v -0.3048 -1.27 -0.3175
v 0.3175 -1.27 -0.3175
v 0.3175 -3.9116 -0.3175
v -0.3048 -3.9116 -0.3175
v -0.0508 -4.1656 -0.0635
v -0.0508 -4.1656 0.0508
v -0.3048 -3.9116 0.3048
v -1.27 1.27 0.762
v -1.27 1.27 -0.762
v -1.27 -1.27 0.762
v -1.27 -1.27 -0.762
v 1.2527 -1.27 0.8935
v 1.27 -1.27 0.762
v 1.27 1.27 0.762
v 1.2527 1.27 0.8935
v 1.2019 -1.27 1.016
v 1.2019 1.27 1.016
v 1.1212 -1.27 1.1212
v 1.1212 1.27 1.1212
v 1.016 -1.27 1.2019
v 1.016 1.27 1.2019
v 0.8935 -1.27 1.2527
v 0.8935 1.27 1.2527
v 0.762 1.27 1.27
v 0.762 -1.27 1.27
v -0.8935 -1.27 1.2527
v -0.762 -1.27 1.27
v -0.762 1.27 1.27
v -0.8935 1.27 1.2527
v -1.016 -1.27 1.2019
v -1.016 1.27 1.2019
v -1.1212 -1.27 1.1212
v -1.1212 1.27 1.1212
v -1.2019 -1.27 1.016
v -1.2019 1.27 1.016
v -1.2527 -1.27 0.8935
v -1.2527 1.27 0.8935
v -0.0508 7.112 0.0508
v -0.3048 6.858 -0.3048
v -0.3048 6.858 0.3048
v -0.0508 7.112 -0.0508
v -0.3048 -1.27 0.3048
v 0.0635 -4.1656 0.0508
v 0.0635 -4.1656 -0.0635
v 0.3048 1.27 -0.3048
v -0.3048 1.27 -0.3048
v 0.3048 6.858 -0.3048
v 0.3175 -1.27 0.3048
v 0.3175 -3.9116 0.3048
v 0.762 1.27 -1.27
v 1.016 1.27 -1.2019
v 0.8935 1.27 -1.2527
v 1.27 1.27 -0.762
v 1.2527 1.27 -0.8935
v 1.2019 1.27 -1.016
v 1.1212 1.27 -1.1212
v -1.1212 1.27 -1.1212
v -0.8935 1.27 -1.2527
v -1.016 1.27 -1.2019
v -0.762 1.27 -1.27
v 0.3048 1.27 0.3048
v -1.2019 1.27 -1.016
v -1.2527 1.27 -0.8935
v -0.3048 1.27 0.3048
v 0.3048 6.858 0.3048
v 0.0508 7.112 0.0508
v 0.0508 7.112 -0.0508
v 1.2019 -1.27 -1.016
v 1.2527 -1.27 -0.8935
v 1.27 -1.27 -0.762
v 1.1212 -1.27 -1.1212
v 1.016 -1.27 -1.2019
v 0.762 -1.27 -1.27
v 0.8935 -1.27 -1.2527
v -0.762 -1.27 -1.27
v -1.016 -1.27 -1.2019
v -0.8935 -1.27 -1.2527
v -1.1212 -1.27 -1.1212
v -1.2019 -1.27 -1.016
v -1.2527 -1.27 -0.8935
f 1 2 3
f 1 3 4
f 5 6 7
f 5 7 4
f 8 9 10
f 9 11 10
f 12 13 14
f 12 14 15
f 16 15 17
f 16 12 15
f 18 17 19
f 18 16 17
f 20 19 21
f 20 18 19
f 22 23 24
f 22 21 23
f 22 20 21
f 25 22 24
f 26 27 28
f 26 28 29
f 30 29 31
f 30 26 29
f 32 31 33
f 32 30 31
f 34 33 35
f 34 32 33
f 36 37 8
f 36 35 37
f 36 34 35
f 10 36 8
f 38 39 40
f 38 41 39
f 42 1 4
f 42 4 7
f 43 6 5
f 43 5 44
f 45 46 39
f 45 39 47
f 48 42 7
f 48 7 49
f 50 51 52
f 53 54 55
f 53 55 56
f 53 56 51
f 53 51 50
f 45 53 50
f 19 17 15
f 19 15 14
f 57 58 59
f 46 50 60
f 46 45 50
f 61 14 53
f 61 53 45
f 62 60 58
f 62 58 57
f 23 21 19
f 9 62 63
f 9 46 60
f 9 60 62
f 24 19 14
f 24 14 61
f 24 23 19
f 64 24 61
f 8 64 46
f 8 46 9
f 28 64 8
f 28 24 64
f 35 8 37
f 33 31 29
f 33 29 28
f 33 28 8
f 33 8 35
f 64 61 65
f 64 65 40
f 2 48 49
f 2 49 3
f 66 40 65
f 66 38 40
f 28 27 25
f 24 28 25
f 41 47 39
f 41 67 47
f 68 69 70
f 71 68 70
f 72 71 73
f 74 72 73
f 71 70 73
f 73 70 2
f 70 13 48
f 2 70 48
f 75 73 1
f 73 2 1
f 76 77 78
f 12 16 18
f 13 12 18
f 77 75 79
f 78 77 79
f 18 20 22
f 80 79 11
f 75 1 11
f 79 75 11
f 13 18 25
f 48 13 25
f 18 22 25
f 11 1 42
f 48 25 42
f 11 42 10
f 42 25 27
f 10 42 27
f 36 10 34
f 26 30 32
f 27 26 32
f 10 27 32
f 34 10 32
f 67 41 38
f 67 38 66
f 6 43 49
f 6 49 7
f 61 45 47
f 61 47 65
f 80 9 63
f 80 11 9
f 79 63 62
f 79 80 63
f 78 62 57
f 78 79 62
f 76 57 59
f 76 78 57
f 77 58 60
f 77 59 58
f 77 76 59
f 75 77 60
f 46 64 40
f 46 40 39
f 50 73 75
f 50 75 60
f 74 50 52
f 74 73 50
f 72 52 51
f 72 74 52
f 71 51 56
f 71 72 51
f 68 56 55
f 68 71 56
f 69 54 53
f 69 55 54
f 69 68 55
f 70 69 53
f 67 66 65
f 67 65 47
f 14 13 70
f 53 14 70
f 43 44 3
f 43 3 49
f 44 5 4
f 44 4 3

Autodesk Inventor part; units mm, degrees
ref_plane "YZ Plane" through (0, 0, 0) normal (1, 0, 0) x (0, 1, 0)
ref_plane "XZ Plane" through (0, 0, 0) normal (0, 1, 0) x (-1, 0, 0)
ref_plane "XY Plane" through (0, 0, 0) normal (0, 0, 1) x (1, 0, 0)
sketch "Sketch1" plane through (0, 0, 0) normal (0, 1, 0) x (-1, 0, 0)
  line L0 (-0.762, -1.27) -> (0.762, -1.27)
  line L1 (1.27, -0.762) -> (1.27, 0.762)
  line L2 (0.762, 1.27) -> (-0.762, 1.27)
  line L3 (-1.27, 0.762) -> (-1.27, -0.762)
  line L4 (-1.27, -1.27) -> (1.27, 1.27) construction
  line L5 (1.27, -1.27) -> (-1.27, 1.27) construction
  arc A0 (1.27, 0.762) -> (0.762, 1.27) centre (0.762, 0.762) ccw
  arc A1 (0.762, -1.27) -> (1.27, -0.762) centre (0.762, -0.762) ccw
  arc A2 (-1.27, -0.762) -> (-0.762, -1.27) centre (-0.762, -0.762) ccw
  arc A3 (-0.762, 1.27) -> (-1.27, 0.762) centre (-0.762, 0.762) ccw
  line L6 (-0.762, -3.81) -> (0.762, -3.81)
  line L7 (1.27, -3.302) -> (1.27, -1.778)
  line L8 (0.762, -1.27) -> (-0.762, -1.27)
  line L9 (-1.27, -1.778) -> (-1.27, -3.302)
  line L10 (-1.27, -3.81) -> (1.27, -1.27) construction
  line L11 (1.27, -3.81) -> (-1.27, -1.27) construction
  arc A4 (1.27, -1.778) -> (0.762, -1.27) centre (0.762, -1.778) ccw
  arc A5 (0.762, -3.81) -> (1.27, -3.302) centre (0.762, -3.302) ccw
  arc A6 (-1.27, -3.302) -> (-0.762, -3.81) centre (-0.762, -3.302) ccw
  arc A7 (-0.762, -1.27) -> (-1.27, -1.778) centre (-0.762, -1.778) ccw
  line L12 (-0.762, -6.35) -> (0.762, -6.35)
  line L13 (1.27, -5.842) -> (1.27, -4.318)
  line L14 (0.762, -3.81) -> (-0.762, -3.81)
  line L15 (-1.27, -4.318) -> (-1.27, -5.842)
  line L16 (-1.27, -6.35) -> (1.27, -3.81) construction
  line L17 (1.27, -6.35) -> (-1.27, -3.81) construction
  arc A8 (1.27, -4.318) -> (0.762, -3.81) centre (0.762, -4.318) ccw
  arc A9 (0.762, -6.35) -> (1.27, -5.842) centre (0.762, -5.842) ccw
  arc A10 (-1.27, -5.842) -> (-0.762, -6.35) centre (-0.762, -5.842) ccw
  arc A11 (-0.762, -3.81) -> (-1.27, -4.318) centre (-0.762, -4.318) ccw
  line L18 (-0.762, -8.89) -> (0.762, -8.89)
  line L19 (1.27, -8.382) -> (1.27, -6.858)
  line L20 (0.762, -6.35) -> (-0.762, -6.35)
  line L21 (-1.27, -6.858) -> (-1.27, -8.382)
  line L22 (-1.27, -8.89) -> (1.27, -6.35) construction
  line L23 (1.27, -8.89) -> (-1.27, -6.35) construction
  arc A12 (1.27, -6.858) -> (0.762, -6.35) centre (0.762, -6.858) ccw
  arc A13 (0.762, -8.89) -> (1.27, -8.382) centre (0.762, -8.382) ccw
  arc A14 (-1.27, -8.382) -> (-0.762, -8.89) centre (-0.762, -8.382) ccw
  arc A15 (-0.762, -6.35) -> (-1.27, -6.858) centre (-0.762, -6.858) ccw
  line L24 (-0.762, -11.43) -> (0.762, -11.43)
  line L25 (1.27, -10.922) -> (1.27, -9.398)
  line L26 (0.762, -8.89) -> (-0.762, -8.89)
  line L27 (-1.27, -9.398) -> (-1.27, -10.922)
  line L28 (-1.27, -11.43) -> (1.27, -8.89) construction
  line L29 (1.27, -11.43) -> (-1.27, -8.89) construction
  arc A16 (1.27, -9.398) -> (0.762, -8.89) centre (0.762, -9.398) ccw
  arc A17 (0.762, -11.43) -> (1.27, -10.922) centre (0.762, -10.922) ccw
  arc A18 (-1.27, -10.922) -> (-0.762, -11.43) centre (-0.762, -10.922) ccw
  arc A19 (-0.762, -8.89) -> (-1.27, -9.398) centre (-0.762, -9.398) ccw
  line L30 (-0.762, -13.97) -> (0.762, -13.97)
  line L31 (1.27, -13.462) -> (1.27, -11.938)
  line L32 (0.762, -11.43) -> (-0.762, -11.43)
  line L33 (-1.27, -11.938) -> (-1.27, -13.462)
  line L34 (-1.27, -13.97) -> (1.27, -11.43) construction
  line L35 (1.27, -13.97) -> (-1.27, -11.43) construction
  arc A20 (1.27, -11.938) -> (0.762, -11.43) centre (0.762, -11.938) ccw
  arc A21 (0.762, -13.97) -> (1.27, -13.462) centre (0.762, -13.462) ccw
  arc A22 (-1.27, -13.462) -> (-0.762, -13.97) centre (-0.762, -13.462) ccw
  arc A23 (-0.762, -11.43) -> (-1.27, -11.938) centre (-0.762, -11.938) ccw
  line L36 (-0.762, -16.51) -> (0.762, -16.51)
  line L37 (1.27, -16.002) -> (1.27, -14.478)
  line L38 (0.762, -13.97) -> (-0.762, -13.97)
  line L39 (-1.27, -14.478) -> (-1.27, -16.002)
  line L40 (-1.27, -16.51) -> (1.27, -13.97) construction
  line L41 (1.27, -16.51) -> (-1.27, -13.97) construction
  arc A24 (1.27, -14.478) -> (0.762, -13.97) centre (0.762, -14.478) ccw
  arc A25 (0.762, -16.51) -> (1.27, -16.002) centre (0.762, -16.002) ccw
  arc A26 (-1.27, -16.002) -> (-0.762, -16.51) centre (-0.762, -16.002) ccw
  arc A27 (-0.762, -13.97) -> (-1.27, -14.478) centre (-0.762, -14.478) ccw
  line L42 (-0.762, -19.05) -> (0.762, -19.05)
  line L43 (1.27, -18.542) -> (1.27, -17.018)
  line L44 (0.762, -16.51) -> (-0.762, -16.51)
  line L45 (-1.27, -17.018) -> (-1.27, -18.542)
  line L46 (-1.27, -19.05) -> (1.27, -16.51) construction
  line L47 (1.27, -19.05) -> (-1.27, -16.51) construction
  arc A28 (1.27, -17.018) -> (0.762, -16.51) centre (0.762, -17.018) ccw
  arc A29 (0.762, -19.05) -> (1.27, -18.542) centre (0.762, -18.542) ccw
  arc A30 (-1.27, -18.542) -> (-0.762, -19.05) centre (-0.762, -18.542) ccw
  arc A31 (-0.762, -16.51) -> (-1.27, -17.018) centre (-0.762, -17.018) ccw
  line L48 (-0.762, -21.59) -> (0.762, -21.59)
  line L49 (1.27, -21.082) -> (1.27, -19.558)
  line L50 (0.762, -19.05) -> (-0.762, -19.05)
  line L51 (-1.27, -19.558) -> (-1.27, -21.082)
  line L52 (-1.27, -21.59) -> (1.27, -19.05) construction
  line L53 (1.27, -21.59) -> (-1.27, -19.05) construction
  arc A32 (1.27, -19.558) -> (0.762, -19.05) centre (0.762, -19.558) ccw
  arc A33 (0.762, -21.59) -> (1.27, -21.082) centre (0.762, -21.082) ccw
  arc A34 (-1.27, -21.082) -> (-0.762, -21.59) centre (-0.762, -21.082) ccw
  arc A35 (-0.762, -19.05) -> (-1.27, -19.558) centre (-0.762, -19.558) ccw
  line L54 (-0.762, -24.13) -> (0.762, -24.13)
  line L55 (1.27, -23.622) -> (1.27, -22.098)
  line L56 (0.762, -21.59) -> (-0.762, -21.59)
  line L57 (-1.27, -22.098) -> (-1.27, -23.622)
  line L58 (-1.27, -24.13) -> (1.27, -21.59) construction
  line L59 (1.27, -24.13) -> (-1.27, -21.59) construction
  arc A36 (1.27, -22.098) -> (0.762, -21.59) centre (0.762, -22.098) ccw
  arc A37 (0.762, -24.13) -> (1.27, -23.622) centre (0.762, -23.622) ccw
  arc A38 (-1.27, -23.622) -> (-0.762, -24.13) centre (-0.762, -23.622) ccw
  arc A39 (-0.762, -21.59) -> (-1.27, -22.098) centre (-0.762, -22.098) ccw
  line L60 (-0.762, -26.67) -> (0.762, -26.67)
  line L61 (1.27, -26.162) -> (1.27, -24.638)
  line L62 (0.762, -24.13) -> (-0.762, -24.13)
  line L63 (-1.27, -24.638) -> (-1.27, -26.162)
  line L64 (-1.27, -26.67) -> (1.27, -24.13) construction
  line L65 (1.27, -26.67) -> (-1.27, -24.13) construction
  arc A40 (1.27, -24.638) -> (0.762, -24.13) centre (0.762, -24.638) ccw
  arc A41 (0.762, -26.67) -> (1.27, -26.162) centre (0.762, -26.162) ccw
  arc A42 (-1.27, -26.162) -> (-0.762, -26.67) centre (-0.762, -26.162) ccw
  arc A43 (-0.762, -24.13) -> (-1.27, -24.638) centre (-0.762, -24.638) ccw
  line L66 (-0.762, -29.21) -> (0.762, -29.21)
  line L67 (1.27, -28.702) -> (1.27, -27.178)
  line L68 (0.762, -26.67) -> (-0.762, -26.67)
  line L69 (-1.27, -27.178) -> (-1.27, -28.702)
  line L70 (-1.27, -29.21) -> (1.27, -26.67) construction
  line L71 (1.27, -29.21) -> (-1.27, -26.67) construction
  arc A44 (1.27, -27.178) -> (0.762, -26.67) centre (0.762, -27.178) ccw
  arc A45 (0.762, -29.21) -> (1.27, -28.702) centre (0.762, -28.702) ccw
  arc A46 (-1.27, -28.702) -> (-0.762, -29.21) centre (-0.762, -28.702) ccw
  arc A47 (-0.762, -26.67) -> (-1.27, -27.178) centre (-0.762, -27.178) ccw
  line L72 (-0.762, -31.75) -> (0.762, -31.75)
  line L73 (1.27, -31.242) -> (1.27, -29.718)
  line L74 (0.762, -29.21) -> (-0.762, -29.21)
  line L75 (-1.27, -29.718) -> (-1.27, -31.242)
  line L76 (-1.27, -31.75) -> (1.27, -29.21) construction
  line L77 (1.27, -31.75) -> (-1.27, -29.21) construction
  arc A48 (1.27, -29.718) -> (0.762, -29.21) centre (0.762, -29.718) ccw
  arc A49 (0.762, -31.75) -> (1.27, -31.242) centre (0.762, -31.242) ccw
  arc A50 (-1.27, -31.242) -> (-0.762, -31.75) centre (-0.762, -31.242) ccw
  arc A51 (-0.762, -29.21) -> (-1.27, -29.718) centre (-0.762, -29.718) ccw
  line L78 (-0.762, -34.29) -> (0.762, -34.29)
  line L79 (1.27, -33.782) -> (1.27, -32.258)
  line L80 (0.762, -31.75) -> (-0.762, -31.75)
  line L81 (-1.27, -32.258) -> (-1.27, -33.782)
  line L82 (-1.27, -34.29) -> (1.27, -31.75) construction
  line L83 (1.27, -34.29) -> (-1.27, -31.75) construction
  arc A52 (1.27, -32.258) -> (0.762, -31.75) centre (0.762, -32.258) ccw
  arc A53 (0.762, -34.29) -> (1.27, -33.782) centre (0.762, -33.782) ccw
  arc A54 (-1.27, -33.782) -> (-0.762, -34.29) centre (-0.762, -33.782) ccw
  arc A55 (-0.762, -31.75) -> (-1.27, -32.258) centre (-0.762, -32.258) ccw
  line L84 (-0.762, -36.83) -> (0.762, -36.83)
  line L85 (1.27, -36.322) -> (1.27, -34.798)
  line L86 (0.762, -34.29) -> (-0.762, -34.29)
  line L87 (-1.27, -34.798) -> (-1.27, -36.322)
  line L88 (-1.27, -36.83) -> (1.27, -34.29) construction
  line L89 (1.27, -36.83) -> (-1.27, -34.29) construction
  arc A56 (1.27, -34.798) -> (0.762, -34.29) centre (0.762, -34.798) ccw
  arc A57 (0.762, -36.83) -> (1.27, -36.322) centre (0.762, -36.322) ccw
  arc A58 (-1.27, -36.322) -> (-0.762, -36.83) centre (-0.762, -36.322) ccw
  arc A59 (-0.762, -34.29) -> (-1.27, -34.798) centre (-0.762, -34.798) ccw
  line L90 (-0.762, -39.37) -> (0.762, -39.37)
  line L91 (1.27, -38.862) -> (1.27, -37.338)
  line L92 (0.762, -36.83) -> (-0.762, -36.83)
  line L93 (-1.27, -37.338) -> (-1.27, -38.862)
  line L94 (-1.27, -39.37) -> (1.27, -36.83) construction
  line L95 (1.27, -39.37) -> (-1.27, -36.83) construction
  arc A60 (1.27, -37.338) -> (0.762, -36.83) centre (0.762, -37.338) ccw
  arc A61 (0.762, -39.37) -> (1.27, -38.862) centre (0.762, -38.862) ccw
  arc A62 (-1.27, -38.862) -> (-0.762, -39.37) centre (-0.762, -38.862) ccw
  arc A63 (-0.762, -36.83) -> (-1.27, -37.338) centre (-0.762, -37.338) ccw
  point P0 (0, 0)
  point P1 (0, -2.54)
  point P2 (0, -5.08)
  point P3 (0, -7.62)
  point P4 (0, -10.16)
  point P5 (0, -12.7)
  point P6 (0, -15.24)
  point P7 (0, -17.78)
  point P8 (0, -20.32)
  point P9 (0, -22.86)
  point P10 (0, -25.4)
  point P11 (0, -27.94)
  point P12 (0, -30.48)
  point P13 (0, -33.02)
  point P14 (0, -35.56)
  point P15 (0, -38.1)
  dimension "d0" = 2.54
  dimension "d1" = 0.508
  dimension "d4" = 2.54
extrude "Extrusion1" add sketch "Sketch1" along normal mid plane 2.54
sketch "Sketch2" plane through (0, 1.27, 0) normal (0, 1, 0) x (1, 0, 0)
  line L0 (-0.3048, 0.3048) -> (0.3048, 0.3048)
  line L1 (0.3048, 0.3048) -> (0.3048, -0.3048)
  line L2 (0.3048, -0.3048) -> (-0.3048, -0.3048)
  line L3 (-0.3048, -0.3048) -> (-0.3048, 0.3048)
  line L4 (-0.3048, 0.3048) -> (0.3048, -0.3048) construction
  line L5 (0.3048, 0.3048) -> (-0.3048, -0.3048) construction
  line L6 (-1.27, 0.762) -> (-1.27, -0.762) projected
  line L7 (-0.3048, 2.8448) -> (0.3048, 2.8448)
  line L8 (0.3048, 2.8448) -> (0.3048, 2.2352)
  line L9 (0.3048, 2.2352) -> (-0.3048, 2.2352)
  line L10 (-0.3048, 2.2352) -> (-0.3048, 2.8448)
  line L11 (-0.3048, 2.8448) -> (0.3048, 2.2352) construction
  line L12 (0.3048, 2.8448) -> (-0.3048, 2.2352) construction
  line L13 (-0.3048, 5.3848) -> (0.3048, 5.3848)
  line L14 (0.3048, 5.3848) -> (0.3048, 4.7752)
  line L15 (0.3048, 4.7752) -> (-0.3048, 4.7752)
  line L16 (-0.3048, 4.7752) -> (-0.3048, 5.3848)
  line L17 (-0.3048, 5.3848) -> (0.3048, 4.7752) construction
  line L18 (0.3048, 5.3848) -> (-0.3048, 4.7752) construction
  line L19 (-0.3048, 7.9248) -> (0.3048, 7.9248)
  line L20 (0.3048, 7.9248) -> (0.3048, 7.3152)
  line L21 (0.3048, 7.3152) -> (-0.3048, 7.3152)
  line L22 (-0.3048, 7.3152) -> (-0.3048, 7.9248)
  line L23 (-0.3048, 7.9248) -> (0.3048, 7.3152) construction
  line L24 (0.3048, 7.9248) -> (-0.3048, 7.3152) construction
  line L25 (-0.3048, 10.4648) -> (0.3048, 10.4648)
  line L26 (0.3048, 10.4648) -> (0.3048, 9.8552)
  line L27 (0.3048, 9.8552) -> (-0.3048, 9.8552)
  line L28 (-0.3048, 9.8552) -> (-0.3048, 10.4648)
  line L29 (-0.3048, 10.4648) -> (0.3048, 9.8552) construction
  line L30 (0.3048, 10.4648) -> (-0.3048, 9.8552) construction
  line L31 (-0.3048, 13.0048) -> (0.3048, 13.0048)
  line L32 (0.3048, 13.0048) -> (0.3048, 12.3952)
  line L33 (0.3048, 12.3952) -> (-0.3048, 12.3952)
  line L34 (-0.3048, 12.3952) -> (-0.3048, 13.0048)
  line L35 (-0.3048, 13.0048) -> (0.3048, 12.3952) construction
  line L36 (0.3048, 13.0048) -> (-0.3048, 12.3952) construction
  line L37 (-0.3048, 15.5448) -> (0.3048, 15.5448)
  line L38 (0.3048, 15.5448) -> (0.3048, 14.9352)
  line L39 (0.3048, 14.9352) -> (-0.3048, 14.9352)
  line L40 (-0.3048, 14.9352) -> (-0.3048, 15.5448)
  line L41 (-0.3048, 15.5448) -> (0.3048, 14.9352) construction
  line L42 (0.3048, 15.5448) -> (-0.3048, 14.9352) construction
  line L43 (-0.3048, 18.0848) -> (0.3048, 18.0848)
  line L44 (0.3048, 18.0848) -> (0.3048, 17.4752)
  line L45 (0.3048, 17.4752) -> (-0.3048, 17.4752)
  line L46 (-0.3048, 17.4752) -> (-0.3048, 18.0848)
  line L47 (-0.3048, 18.0848) -> (0.3048, 17.4752) construction
  line L48 (0.3048, 18.0848) -> (-0.3048, 17.4752) construction
  line L49 (-0.3048, 20.6248) -> (0.3048, 20.6248)
  line L50 (0.3048, 20.6248) -> (0.3048, 20.0152)
  line L51 (0.3048, 20.0152) -> (-0.3048, 20.0152)
  line L52 (-0.3048, 20.0152) -> (-0.3048, 20.6248)
  line L53 (-0.3048, 20.6248) -> (0.3048, 20.0152) construction
  line L54 (0.3048, 20.6248) -> (-0.3048, 20.0152) construction
  line L55 (-0.3048, 23.1648) -> (0.3048, 23.1648)
  line L56 (0.3048, 23.1648) -> (0.3048, 22.5552)
  line L57 (0.3048, 22.5552) -> (-0.3048, 22.5552)
  line L58 (-0.3048, 22.5552) -> (-0.3048, 23.1648)
  line L59 (-0.3048, 23.1648) -> (0.3048, 22.5552) construction
  line L60 (0.3048, 23.1648) -> (-0.3048, 22.5552) construction
  line L61 (-0.3048, 25.7048) -> (0.3048, 25.7048)
  line L62 (0.3048, 25.7048) -> (0.3048, 25.0952)
  line L63 (0.3048, 25.0952) -> (-0.3048, 25.0952)
  line L64 (-0.3048, 25.0952) -> (-0.3048, 25.7048)
  line L65 (-0.3048, 25.7048) -> (0.3048, 25.0952) construction
  line L66 (0.3048, 25.7048) -> (-0.3048, 25.0952) construction
  line L67 (-0.3048, 28.2448) -> (0.3048, 28.2448)
  line L68 (0.3048, 28.2448) -> (0.3048, 27.6352)
  line L69 (0.3048, 27.6352) -> (-0.3048, 27.6352)
  line L70 (-0.3048, 27.6352) -> (-0.3048, 28.2448)
  line L71 (-0.3048, 28.2448) -> (0.3048, 27.6352) construction
  line L72 (0.3048, 28.2448) -> (-0.3048, 27.6352) construction
  line L73 (-0.3048, 30.7848) -> (0.3048, 30.7848)
  line L74 (0.3048, 30.7848) -> (0.3048, 30.1752)
  line L75 (0.3048, 30.1752) -> (-0.3048, 30.1752)
  line L76 (-0.3048, 30.1752) -> (-0.3048, 30.7848)
  line L77 (-0.3048, 30.7848) -> (0.3048, 30.1752) construction
  line L78 (0.3048, 30.7848) -> (-0.3048, 30.1752) construction
  line L79 (-0.3048, 33.3248) -> (0.3048, 33.3248)
  line L80 (0.3048, 33.3248) -> (0.3048, 32.7152)
  line L81 (0.3048, 32.7152) -> (-0.3048, 32.7152)
  line L82 (-0.3048, 32.7152) -> (-0.3048, 33.3248)
  line L83 (-0.3048, 33.3248) -> (0.3048, 32.7152) construction
  line L84 (0.3048, 33.3248) -> (-0.3048, 32.7152) construction
  line L85 (-0.3048, 35.8648) -> (0.3048, 35.8648)
  line L86 (0.3048, 35.8648) -> (0.3048, 35.2552)
  line L87 (0.3048, 35.2552) -> (-0.3048, 35.2552)
  line L88 (-0.3048, 35.2552) -> (-0.3048, 35.8648)
  line L89 (-0.3048, 35.8648) -> (0.3048, 35.2552) construction
  line L90 (0.3048, 35.8648) -> (-0.3048, 35.2552) construction
  line L91 (-0.3048, 38.4048) -> (0.3048, 38.4048)
  line L92 (0.3048, 38.4048) -> (0.3048, 37.7952)
  line L93 (0.3048, 37.7952) -> (-0.3048, 37.7952)
  line L94 (-0.3048, 37.7952) -> (-0.3048, 38.4048)
  line L95 (-0.3048, 38.4048) -> (0.3048, 37.7952) construction
  line L96 (0.3048, 38.4048) -> (-0.3048, 37.7952) construction
  point P0 (0, 0)
  dimension "d11" = 0.6096
  dimension "d14" = 2.54
extrude "Extrusion2" add sketch "Sketch2" along normal blind 5.842
chamfer "Chamfer2" distance 0.254 angle 45 64 edges at (0, 7.112, -20.6248) (-0.3048, 7.112, -20.32) (0.3048, 7.112, -20.32) (0, 7.112, -20.0152) (0, 7.112, -18.0848) (-0.3048, 7.112, -17.78) (0, 7.112, -17.4752) (0.3048, 7.112, -17.78) (0, 7.112, -15.5448) (-0.3048, 7.112, -15.24) (0.3048, 7.112, -15.24) (0, 7.112, -13.0048) (-0.3048, 7.112, -12.7) (0, 7.112, -12.3952) (0.3048, 7.112, -12.7) (0, 7.112, -14.9352) (-0.3048, 7.112, -7.62) (0, 7.112, -7.3152) (0.3048, 7.112, -7.62) (0, 7.112, -9.8552) (0, 7.112, -10.4648) (-0.3048, 7.112, -10.16) (0.3048, 7.112, -10.16) (0, 7.112, -7.9248) (0, 7.112, -2.8448) (-0.3048, 7.112, -2.54) (0, 7.112, -2.2352) (0.3048, 7.112, -2.54) (0, 7.112, -4.7752) (0.3048, 7.112, -5.08) (0, 7.112, -5.3848) (-0.3048, 7.112, -5.08) (0, 7.112, -0.3048) (-0.3048, 7.112, 0) (0, 7.112, 0.3048) (0.3048, 7.112, 0) (0, 7.112, -23.1648) (-0.3048, 7.112, -22.86) (0, 7.112, -22.5552) (0.3048, 7.112, -22.86) (0, 7.112, -25.0952) (-0.3048, 7.112, -25.4) (0, 7.112, -25.7048) (0.3048, 7.112, -25.4) (0, 7.112, -28.2448) (0, 7.112, -27.6352) (0.3048, 7.112, -27.94) (-0.3048, 7.112, -27.94) (0.3048, 7.112, -30.48) (0, 7.112, -38.4048) (-0.3048, 7.112, -38.1) (0, 7.112, -37.7952) (0.3048, 7.112, -38.1) (0, 7.112, -35.8648) (-0.3048, 7.112, -35.56) (0, 7.112, -35.2552) (0.3048, 7.112, -35.56) (0, 7.112, -33.3248) (-0.3048, 7.112, -33.02) (0, 7.112, -32.7152) (0, 7.112, -30.1752) (0, 7.112, -30.7848) (-0.3048, 7.112, -30.48) (0.3048, 7.112, -33.02)
sketch "Sketch6" plane through (0, -1.27, 0) normal (0, -1, 0) x (1, 0, 0)
  line L0 (-0.3048, 0.3048) -> (-0.3048, -0.3048) projected
  line L1 (0.3175, -0.3175) -> (-0.3048, -0.3175)
  line L2 (-0.3048, -0.3175) -> (-0.3048, 0.3048)
  line L3 (-0.3048, 0.3048) -> (0.3175, 0.3048)
  line L4 (0.3175, 0.3048) -> (0.3175, -0.3175)
  line L5 (0.3175, -0.3175) -> (-0.3048, 0.3048) construction
  line L6 (-0.3048, -0.3175) -> (0.3175, 0.3048) construction
  line L7 (1.27, -0.762) -> (1.27, 0.762) construction
  line L8 (0.3175, -2.8575) -> (-0.3048, -2.8575)
  line L9 (-0.3048, -2.8575) -> (-0.3048, -2.2352)
  line L10 (-0.3048, -2.2352) -> (0.3175, -2.2352)
  line L11 (0.3175, -2.2352) -> (0.3175, -2.8575)
  line L12 (0.3175, -2.8575) -> (-0.3048, -2.2352) construction
  line L13 (-0.3048, -2.8575) -> (0.3175, -2.2352) construction
  line L14 (0.3175, -5.3975) -> (-0.3048, -5.3975)
  line L15 (-0.3048, -5.3975) -> (-0.3048, -4.7752)
  line L16 (-0.3048, -4.7752) -> (0.3175, -4.7752)
  line L17 (0.3175, -4.7752) -> (0.3175, -5.3975)
  line L18 (0.3175, -5.3975) -> (-0.3048, -4.7752) construction
  line L19 (-0.3048, -5.3975) -> (0.3175, -4.7752) construction
  line L20 (0.3175, -7.9375) -> (-0.3048, -7.9375)
  line L21 (-0.3048, -7.9375) -> (-0.3048, -7.3152)
  line L22 (-0.3048, -7.3152) -> (0.3175, -7.3152)
  line L23 (0.3175, -7.3152) -> (0.3175, -7.9375)
  line L24 (0.3175, -7.9375) -> (-0.3048, -7.3152) construction
  line L25 (-0.3048, -7.9375) -> (0.3175, -7.3152) construction
  line L26 (0.3175, -10.4775) -> (-0.3048, -10.4775)
  line L27 (-0.3048, -10.4775) -> (-0.3048, -9.8552)
  line L28 (-0.3048, -9.8552) -> (0.3175, -9.8552)
  line L29 (0.3175, -9.8552) -> (0.3175, -10.4775)
  line L30 (0.3175, -10.4775) -> (-0.3048, -9.8552) construction
  line L31 (-0.3048, -10.4775) -> (0.3175, -9.8552) construction
  line L32 (0.3175, -13.0175) -> (-0.3048, -13.0175)
  line L33 (-0.3048, -13.0175) -> (-0.3048, -12.3952)
  line L34 (-0.3048, -12.3952) -> (0.3175, -12.3952)
  line L35 (0.3175, -12.3952) -> (0.3175, -13.0175)
  line L36 (0.3175, -13.0175) -> (-0.3048, -12.3952) construction
  line L37 (-0.3048, -13.0175) -> (0.3175, -12.3952) construction
  line L38 (0.3175, -15.5575) -> (-0.3048, -15.5575)
  line L39 (-0.3048, -15.5575) -> (-0.3048, -14.9352)
  line L40 (-0.3048, -14.9352) -> (0.3175, -14.9352)
  line L41 (0.3175, -14.9352) -> (0.3175, -15.5575)
  line L42 (0.3175, -15.5575) -> (-0.3048, -14.9352) construction
  line L43 (-0.3048, -15.5575) -> (0.3175, -14.9352) construction
  line L44 (0.3175, -18.0975) -> (-0.3048, -18.0975)
  line L45 (-0.3048, -18.0975) -> (-0.3048, -17.4752)
  line L46 (-0.3048, -17.4752) -> (0.3175, -17.4752)
  line L47 (0.3175, -17.4752) -> (0.3175, -18.0975)
  line L48 (0.3175, -18.0975) -> (-0.3048, -17.4752) construction
  line L49 (-0.3048, -18.0975) -> (0.3175, -17.4752) construction
  line L50 (0.3175, -20.6375) -> (-0.3048, -20.6375)
  line L51 (-0.3048, -20.6375) -> (-0.3048, -20.0152)
  line L52 (-0.3048, -20.0152) -> (0.3175, -20.0152)
  line L53 (0.3175, -20.0152) -> (0.3175, -20.6375)
  line L54 (0.3175, -20.6375) -> (-0.3048, -20.0152) construction
  line L55 (-0.3048, -20.6375) -> (0.3175, -20.0152) construction
  line L56 (0.3175, -23.1775) -> (-0.3048, -23.1775)
  line L57 (-0.3048, -23.1775) -> (-0.3048, -22.5552)
  line L58 (-0.3048, -22.5552) -> (0.3175, -22.5552)
  line L59 (0.3175, -22.5552) -> (0.3175, -23.1775)
  line L60 (0.3175, -23.1775) -> (-0.3048, -22.5552) construction
  line L61 (-0.3048, -23.1775) -> (0.3175, -22.5552) construction
  line L62 (0.3175, -25.7175) -> (-0.3048, -25.7175)
  line L63 (-0.3048, -25.7175) -> (-0.3048, -25.0952)
  line L64 (-0.3048, -25.0952) -> (0.3175, -25.0952)
  line L65 (0.3175, -25.0952) -> (0.3175, -25.7175)
  line L66 (0.3175, -25.7175) -> (-0.3048, -25.0952) construction
  line L67 (-0.3048, -25.7175) -> (0.3175, -25.0952) construction
  line L68 (0.3175, -28.2575) -> (-0.3048, -28.2575)
  line L69 (-0.3048, -28.2575) -> (-0.3048, -27.6352)
  line L70 (-0.3048, -27.6352) -> (0.3175, -27.6352)
  line L71 (0.3175, -27.6352) -> (0.3175, -28.2575)
  line L72 (0.3175, -28.2575) -> (-0.3048, -27.6352) construction
  line L73 (-0.3048, -28.2575) -> (0.3175, -27.6352) construction
  line L74 (0.3175, -30.7975) -> (-0.3048, -30.7975)
  line L75 (-0.3048, -30.7975) -> (-0.3048, -30.1752)
  line L76 (-0.3048, -30.1752) -> (0.3175, -30.1752)
  line L77 (0.3175, -30.1752) -> (0.3175, -30.7975)
  line L78 (0.3175, -30.7975) -> (-0.3048, -30.1752) construction
  line L79 (-0.3048, -30.7975) -> (0.3175, -30.1752) construction
  line L80 (0.3175, -33.3375) -> (-0.3048, -33.3375)
  line L81 (-0.3048, -33.3375) -> (-0.3048, -32.7152)
  line L82 (-0.3048, -32.7152) -> (0.3175, -32.7152)
  line L83 (0.3175, -32.7152) -> (0.3175, -33.3375)
  line L84 (0.3175, -33.3375) -> (-0.3048, -32.7152) construction
  line L85 (-0.3048, -33.3375) -> (0.3175, -32.7152) construction
  line L86 (0.3175, -35.8775) -> (-0.3048, -35.8775)
  line L87 (-0.3048, -35.8775) -> (-0.3048, -35.2552)
  line L88 (-0.3048, -35.2552) -> (0.3175, -35.2552)
  line L89 (0.3175, -35.2552) -> (0.3175, -35.8775)
  line L90 (0.3175, -35.8775) -> (-0.3048, -35.2552) construction
  line L91 (-0.3048, -35.8775) -> (0.3175, -35.2552) construction
  line L92 (0.3175, -38.4175) -> (-0.3048, -38.4175)
  line L93 (-0.3048, -38.4175) -> (-0.3048, -37.7952)
  line L94 (-0.3048, -37.7952) -> (0.3175, -37.7952)
  line L95 (0.3175, -37.7952) -> (0.3175, -38.4175)
  line L96 (0.3175, -38.4175) -> (-0.3048, -37.7952) construction
  line L97 (-0.3048, -38.4175) -> (0.3175, -37.7952) construction
  point P0 (0.0064, -0.0063)
  point P1 (-0.3048, -2.8448)
  point P2 (0.0064, -2.5463)
  point P3 (-0.3048, -5.3848)
  point P4 (0.0064, -5.0863)
  point P5 (-0.3048, -7.9248)
  point P6 (0.0064, -7.6263)
  point P7 (-0.3048, -10.4648)
  point P8 (0.0064, -10.1663)
  point P9 (-0.3048, -13.0048)
  point P10 (0.0064, -12.7064)
  point P11 (-0.3048, -15.5448)
  point P12 (0.0064, -15.2463)
  point P13 (-0.3048, -18.0848)
  point P14 (0.0064, -17.7863)
  point P15 (-0.3048, -20.6248)
  point P16 (0.0064, -20.3263)
  point P17 (-0.3048, -23.1648)
  point P18 (0.0064, -22.8664)
  point P19 (-0.3048, -25.7048)
  point P20 (0.0064, -25.4063)
  point P21 (-0.3048, -28.2448)
  point P22 (0.0064, -27.9463)
  point P23 (-0.3048, -30.7848)
  point P24 (0.0064, -30.4864)
  point P25 (-0.3048, -33.3248)
  point P26 (0.0064, -33.0264)
  point P27 (-0.3048, -35.8648)
  point P28 (0.0064, -35.5663)
  point P29 (-0.3048, -38.4048)
  point P30 (0.0064, -38.1063)
  dimension "d31" = 2.54
extrude "Extrusion3" add sketch "Sketch6" along normal blind 2.8956
chamfer "Chamfer4" distance 0.254 angle 45 64 edges at (0.0063, -4.1656, -18.0975) (0.0064, -4.1656, -17.4752) (-0.3048, -4.1656, -17.7863) (0.3175, -4.1656, -17.7863) (0.3175, -4.1656, -15.2463) (0.0064, -4.1656, -14.9352) (-0.3048, -4.1656, -15.2463) (0.0063, -4.1656, -15.5575) (0.0063, -4.1656, -23.1775) (0.3175, -4.1656, -22.8664) (0.0064, -4.1656, -22.5552) (-0.3048, -4.1656, -22.8664) (0.0063, -4.1656, -25.7175) (0.3175, -4.1656, -25.4064) (-0.3048, -4.1656, -25.4063) (0.0064, -4.1656, -25.0952) (0.0063, -4.1656, -28.2575) (0.3175, -4.1656, -27.9464) (0.0064, -4.1656, -27.6352) (-0.3048, -4.1656, -27.9463) (0.0063, -4.1656, -20.6375) (0.3175, -4.1656, -20.3264) (0.0064, -4.1656, -20.0152) (-0.3048, -4.1656, -20.3263) (0.0063, -4.1656, -30.7975) (0.3175, -4.1656, -30.4864) (-0.3048, -4.1656, -30.4864) (0.0064, -4.1656, -30.1752) (0.0063, -4.1656, -33.3375) (0.0064, -4.1656, -32.7152) (-0.3048, -4.1656, -33.0264) (0.3175, -4.1656, -33.0264) (0.0064, -4.1656, -35.2552) (0.3175, -4.1656, -35.5663) (-0.3048, -4.1656, -35.5663) (0.0063, -4.1656, -35.8775) (0.0063, -4.1656, -38.4175) (0.3175, -4.1656, -38.1064) (0.0064, -4.1656, -37.7952) (-0.3048, -4.1656, -38.1063) (0.0063, -4.1656, -13.0175) (0.3175, -4.1656, -12.7064) (0.0064, -4.1656, -12.3952) (-0.3048, -4.1656, -12.7064) (0.0063, -4.1656, -10.4775) (0.3175, -4.1656, -10.1663) (-0.3048, -4.1656, -10.1663) (0.0064, -4.1656, -9.8552) (0.0063, -4.1656, -7.9375) (0.3175, -4.1656, -7.6263) (0.0064, -4.1656, -7.3152) (-0.3048, -4.1656, -7.6263) (0.0063, -4.1656, -2.8575) (0.3175, -4.1656, -2.5463) (0.0064, -4.1656, -2.2352) (-0.3048, -4.1656, -2.5463) (0.0064, -4.1656, -4.7752) (0.3175, -4.1656, -5.0863) (0.0063, -4.1656, -5.3975) (-0.3048, -4.1656, -5.0863) (0.0063, -4.1656, -0.3175) (0.3175, -4.1656, -0.0063) (0.0064, -4.1656, 0.3048) (-0.3048, -4.1656, -0.0063)
sketch "Sketch9" plane through (1.27, -1.27, -0.762) normal (1, 0, 0) x (0, 0, -1)
  line L0 (0.508, 0) -> (0.508, 2.54) projected
  line L1 (38.608, -2.8956) -> (0.508, -2.8956)
  line L2 (0.508, -2.8956) -> (0.508, 8.382)
  line L3 (0.508, 8.382) -> (38.608, 8.382)
  line L4 (36.068, 0) -> (36.068, 2.54) projected
  line L5 (38.608, 2.54) -> (38.1, 2.54) projected
  line L6 (38.608, -2.8956) -> (38.608, 8.382)
  point P0 (-0.762, 1.27)
  point P1 (37.3888, 8.382)
  point P2 (37.4015, -2.8956)
extrude "Extrusion4" cut sketch "Sketch9" against normal through all
sketch "Sketch10" plane through (0, 7.112, 0) normal (0, 1, 0) x (1, 0, 0)
  point P0 (0, 0)
properties part number "1 pin header"
